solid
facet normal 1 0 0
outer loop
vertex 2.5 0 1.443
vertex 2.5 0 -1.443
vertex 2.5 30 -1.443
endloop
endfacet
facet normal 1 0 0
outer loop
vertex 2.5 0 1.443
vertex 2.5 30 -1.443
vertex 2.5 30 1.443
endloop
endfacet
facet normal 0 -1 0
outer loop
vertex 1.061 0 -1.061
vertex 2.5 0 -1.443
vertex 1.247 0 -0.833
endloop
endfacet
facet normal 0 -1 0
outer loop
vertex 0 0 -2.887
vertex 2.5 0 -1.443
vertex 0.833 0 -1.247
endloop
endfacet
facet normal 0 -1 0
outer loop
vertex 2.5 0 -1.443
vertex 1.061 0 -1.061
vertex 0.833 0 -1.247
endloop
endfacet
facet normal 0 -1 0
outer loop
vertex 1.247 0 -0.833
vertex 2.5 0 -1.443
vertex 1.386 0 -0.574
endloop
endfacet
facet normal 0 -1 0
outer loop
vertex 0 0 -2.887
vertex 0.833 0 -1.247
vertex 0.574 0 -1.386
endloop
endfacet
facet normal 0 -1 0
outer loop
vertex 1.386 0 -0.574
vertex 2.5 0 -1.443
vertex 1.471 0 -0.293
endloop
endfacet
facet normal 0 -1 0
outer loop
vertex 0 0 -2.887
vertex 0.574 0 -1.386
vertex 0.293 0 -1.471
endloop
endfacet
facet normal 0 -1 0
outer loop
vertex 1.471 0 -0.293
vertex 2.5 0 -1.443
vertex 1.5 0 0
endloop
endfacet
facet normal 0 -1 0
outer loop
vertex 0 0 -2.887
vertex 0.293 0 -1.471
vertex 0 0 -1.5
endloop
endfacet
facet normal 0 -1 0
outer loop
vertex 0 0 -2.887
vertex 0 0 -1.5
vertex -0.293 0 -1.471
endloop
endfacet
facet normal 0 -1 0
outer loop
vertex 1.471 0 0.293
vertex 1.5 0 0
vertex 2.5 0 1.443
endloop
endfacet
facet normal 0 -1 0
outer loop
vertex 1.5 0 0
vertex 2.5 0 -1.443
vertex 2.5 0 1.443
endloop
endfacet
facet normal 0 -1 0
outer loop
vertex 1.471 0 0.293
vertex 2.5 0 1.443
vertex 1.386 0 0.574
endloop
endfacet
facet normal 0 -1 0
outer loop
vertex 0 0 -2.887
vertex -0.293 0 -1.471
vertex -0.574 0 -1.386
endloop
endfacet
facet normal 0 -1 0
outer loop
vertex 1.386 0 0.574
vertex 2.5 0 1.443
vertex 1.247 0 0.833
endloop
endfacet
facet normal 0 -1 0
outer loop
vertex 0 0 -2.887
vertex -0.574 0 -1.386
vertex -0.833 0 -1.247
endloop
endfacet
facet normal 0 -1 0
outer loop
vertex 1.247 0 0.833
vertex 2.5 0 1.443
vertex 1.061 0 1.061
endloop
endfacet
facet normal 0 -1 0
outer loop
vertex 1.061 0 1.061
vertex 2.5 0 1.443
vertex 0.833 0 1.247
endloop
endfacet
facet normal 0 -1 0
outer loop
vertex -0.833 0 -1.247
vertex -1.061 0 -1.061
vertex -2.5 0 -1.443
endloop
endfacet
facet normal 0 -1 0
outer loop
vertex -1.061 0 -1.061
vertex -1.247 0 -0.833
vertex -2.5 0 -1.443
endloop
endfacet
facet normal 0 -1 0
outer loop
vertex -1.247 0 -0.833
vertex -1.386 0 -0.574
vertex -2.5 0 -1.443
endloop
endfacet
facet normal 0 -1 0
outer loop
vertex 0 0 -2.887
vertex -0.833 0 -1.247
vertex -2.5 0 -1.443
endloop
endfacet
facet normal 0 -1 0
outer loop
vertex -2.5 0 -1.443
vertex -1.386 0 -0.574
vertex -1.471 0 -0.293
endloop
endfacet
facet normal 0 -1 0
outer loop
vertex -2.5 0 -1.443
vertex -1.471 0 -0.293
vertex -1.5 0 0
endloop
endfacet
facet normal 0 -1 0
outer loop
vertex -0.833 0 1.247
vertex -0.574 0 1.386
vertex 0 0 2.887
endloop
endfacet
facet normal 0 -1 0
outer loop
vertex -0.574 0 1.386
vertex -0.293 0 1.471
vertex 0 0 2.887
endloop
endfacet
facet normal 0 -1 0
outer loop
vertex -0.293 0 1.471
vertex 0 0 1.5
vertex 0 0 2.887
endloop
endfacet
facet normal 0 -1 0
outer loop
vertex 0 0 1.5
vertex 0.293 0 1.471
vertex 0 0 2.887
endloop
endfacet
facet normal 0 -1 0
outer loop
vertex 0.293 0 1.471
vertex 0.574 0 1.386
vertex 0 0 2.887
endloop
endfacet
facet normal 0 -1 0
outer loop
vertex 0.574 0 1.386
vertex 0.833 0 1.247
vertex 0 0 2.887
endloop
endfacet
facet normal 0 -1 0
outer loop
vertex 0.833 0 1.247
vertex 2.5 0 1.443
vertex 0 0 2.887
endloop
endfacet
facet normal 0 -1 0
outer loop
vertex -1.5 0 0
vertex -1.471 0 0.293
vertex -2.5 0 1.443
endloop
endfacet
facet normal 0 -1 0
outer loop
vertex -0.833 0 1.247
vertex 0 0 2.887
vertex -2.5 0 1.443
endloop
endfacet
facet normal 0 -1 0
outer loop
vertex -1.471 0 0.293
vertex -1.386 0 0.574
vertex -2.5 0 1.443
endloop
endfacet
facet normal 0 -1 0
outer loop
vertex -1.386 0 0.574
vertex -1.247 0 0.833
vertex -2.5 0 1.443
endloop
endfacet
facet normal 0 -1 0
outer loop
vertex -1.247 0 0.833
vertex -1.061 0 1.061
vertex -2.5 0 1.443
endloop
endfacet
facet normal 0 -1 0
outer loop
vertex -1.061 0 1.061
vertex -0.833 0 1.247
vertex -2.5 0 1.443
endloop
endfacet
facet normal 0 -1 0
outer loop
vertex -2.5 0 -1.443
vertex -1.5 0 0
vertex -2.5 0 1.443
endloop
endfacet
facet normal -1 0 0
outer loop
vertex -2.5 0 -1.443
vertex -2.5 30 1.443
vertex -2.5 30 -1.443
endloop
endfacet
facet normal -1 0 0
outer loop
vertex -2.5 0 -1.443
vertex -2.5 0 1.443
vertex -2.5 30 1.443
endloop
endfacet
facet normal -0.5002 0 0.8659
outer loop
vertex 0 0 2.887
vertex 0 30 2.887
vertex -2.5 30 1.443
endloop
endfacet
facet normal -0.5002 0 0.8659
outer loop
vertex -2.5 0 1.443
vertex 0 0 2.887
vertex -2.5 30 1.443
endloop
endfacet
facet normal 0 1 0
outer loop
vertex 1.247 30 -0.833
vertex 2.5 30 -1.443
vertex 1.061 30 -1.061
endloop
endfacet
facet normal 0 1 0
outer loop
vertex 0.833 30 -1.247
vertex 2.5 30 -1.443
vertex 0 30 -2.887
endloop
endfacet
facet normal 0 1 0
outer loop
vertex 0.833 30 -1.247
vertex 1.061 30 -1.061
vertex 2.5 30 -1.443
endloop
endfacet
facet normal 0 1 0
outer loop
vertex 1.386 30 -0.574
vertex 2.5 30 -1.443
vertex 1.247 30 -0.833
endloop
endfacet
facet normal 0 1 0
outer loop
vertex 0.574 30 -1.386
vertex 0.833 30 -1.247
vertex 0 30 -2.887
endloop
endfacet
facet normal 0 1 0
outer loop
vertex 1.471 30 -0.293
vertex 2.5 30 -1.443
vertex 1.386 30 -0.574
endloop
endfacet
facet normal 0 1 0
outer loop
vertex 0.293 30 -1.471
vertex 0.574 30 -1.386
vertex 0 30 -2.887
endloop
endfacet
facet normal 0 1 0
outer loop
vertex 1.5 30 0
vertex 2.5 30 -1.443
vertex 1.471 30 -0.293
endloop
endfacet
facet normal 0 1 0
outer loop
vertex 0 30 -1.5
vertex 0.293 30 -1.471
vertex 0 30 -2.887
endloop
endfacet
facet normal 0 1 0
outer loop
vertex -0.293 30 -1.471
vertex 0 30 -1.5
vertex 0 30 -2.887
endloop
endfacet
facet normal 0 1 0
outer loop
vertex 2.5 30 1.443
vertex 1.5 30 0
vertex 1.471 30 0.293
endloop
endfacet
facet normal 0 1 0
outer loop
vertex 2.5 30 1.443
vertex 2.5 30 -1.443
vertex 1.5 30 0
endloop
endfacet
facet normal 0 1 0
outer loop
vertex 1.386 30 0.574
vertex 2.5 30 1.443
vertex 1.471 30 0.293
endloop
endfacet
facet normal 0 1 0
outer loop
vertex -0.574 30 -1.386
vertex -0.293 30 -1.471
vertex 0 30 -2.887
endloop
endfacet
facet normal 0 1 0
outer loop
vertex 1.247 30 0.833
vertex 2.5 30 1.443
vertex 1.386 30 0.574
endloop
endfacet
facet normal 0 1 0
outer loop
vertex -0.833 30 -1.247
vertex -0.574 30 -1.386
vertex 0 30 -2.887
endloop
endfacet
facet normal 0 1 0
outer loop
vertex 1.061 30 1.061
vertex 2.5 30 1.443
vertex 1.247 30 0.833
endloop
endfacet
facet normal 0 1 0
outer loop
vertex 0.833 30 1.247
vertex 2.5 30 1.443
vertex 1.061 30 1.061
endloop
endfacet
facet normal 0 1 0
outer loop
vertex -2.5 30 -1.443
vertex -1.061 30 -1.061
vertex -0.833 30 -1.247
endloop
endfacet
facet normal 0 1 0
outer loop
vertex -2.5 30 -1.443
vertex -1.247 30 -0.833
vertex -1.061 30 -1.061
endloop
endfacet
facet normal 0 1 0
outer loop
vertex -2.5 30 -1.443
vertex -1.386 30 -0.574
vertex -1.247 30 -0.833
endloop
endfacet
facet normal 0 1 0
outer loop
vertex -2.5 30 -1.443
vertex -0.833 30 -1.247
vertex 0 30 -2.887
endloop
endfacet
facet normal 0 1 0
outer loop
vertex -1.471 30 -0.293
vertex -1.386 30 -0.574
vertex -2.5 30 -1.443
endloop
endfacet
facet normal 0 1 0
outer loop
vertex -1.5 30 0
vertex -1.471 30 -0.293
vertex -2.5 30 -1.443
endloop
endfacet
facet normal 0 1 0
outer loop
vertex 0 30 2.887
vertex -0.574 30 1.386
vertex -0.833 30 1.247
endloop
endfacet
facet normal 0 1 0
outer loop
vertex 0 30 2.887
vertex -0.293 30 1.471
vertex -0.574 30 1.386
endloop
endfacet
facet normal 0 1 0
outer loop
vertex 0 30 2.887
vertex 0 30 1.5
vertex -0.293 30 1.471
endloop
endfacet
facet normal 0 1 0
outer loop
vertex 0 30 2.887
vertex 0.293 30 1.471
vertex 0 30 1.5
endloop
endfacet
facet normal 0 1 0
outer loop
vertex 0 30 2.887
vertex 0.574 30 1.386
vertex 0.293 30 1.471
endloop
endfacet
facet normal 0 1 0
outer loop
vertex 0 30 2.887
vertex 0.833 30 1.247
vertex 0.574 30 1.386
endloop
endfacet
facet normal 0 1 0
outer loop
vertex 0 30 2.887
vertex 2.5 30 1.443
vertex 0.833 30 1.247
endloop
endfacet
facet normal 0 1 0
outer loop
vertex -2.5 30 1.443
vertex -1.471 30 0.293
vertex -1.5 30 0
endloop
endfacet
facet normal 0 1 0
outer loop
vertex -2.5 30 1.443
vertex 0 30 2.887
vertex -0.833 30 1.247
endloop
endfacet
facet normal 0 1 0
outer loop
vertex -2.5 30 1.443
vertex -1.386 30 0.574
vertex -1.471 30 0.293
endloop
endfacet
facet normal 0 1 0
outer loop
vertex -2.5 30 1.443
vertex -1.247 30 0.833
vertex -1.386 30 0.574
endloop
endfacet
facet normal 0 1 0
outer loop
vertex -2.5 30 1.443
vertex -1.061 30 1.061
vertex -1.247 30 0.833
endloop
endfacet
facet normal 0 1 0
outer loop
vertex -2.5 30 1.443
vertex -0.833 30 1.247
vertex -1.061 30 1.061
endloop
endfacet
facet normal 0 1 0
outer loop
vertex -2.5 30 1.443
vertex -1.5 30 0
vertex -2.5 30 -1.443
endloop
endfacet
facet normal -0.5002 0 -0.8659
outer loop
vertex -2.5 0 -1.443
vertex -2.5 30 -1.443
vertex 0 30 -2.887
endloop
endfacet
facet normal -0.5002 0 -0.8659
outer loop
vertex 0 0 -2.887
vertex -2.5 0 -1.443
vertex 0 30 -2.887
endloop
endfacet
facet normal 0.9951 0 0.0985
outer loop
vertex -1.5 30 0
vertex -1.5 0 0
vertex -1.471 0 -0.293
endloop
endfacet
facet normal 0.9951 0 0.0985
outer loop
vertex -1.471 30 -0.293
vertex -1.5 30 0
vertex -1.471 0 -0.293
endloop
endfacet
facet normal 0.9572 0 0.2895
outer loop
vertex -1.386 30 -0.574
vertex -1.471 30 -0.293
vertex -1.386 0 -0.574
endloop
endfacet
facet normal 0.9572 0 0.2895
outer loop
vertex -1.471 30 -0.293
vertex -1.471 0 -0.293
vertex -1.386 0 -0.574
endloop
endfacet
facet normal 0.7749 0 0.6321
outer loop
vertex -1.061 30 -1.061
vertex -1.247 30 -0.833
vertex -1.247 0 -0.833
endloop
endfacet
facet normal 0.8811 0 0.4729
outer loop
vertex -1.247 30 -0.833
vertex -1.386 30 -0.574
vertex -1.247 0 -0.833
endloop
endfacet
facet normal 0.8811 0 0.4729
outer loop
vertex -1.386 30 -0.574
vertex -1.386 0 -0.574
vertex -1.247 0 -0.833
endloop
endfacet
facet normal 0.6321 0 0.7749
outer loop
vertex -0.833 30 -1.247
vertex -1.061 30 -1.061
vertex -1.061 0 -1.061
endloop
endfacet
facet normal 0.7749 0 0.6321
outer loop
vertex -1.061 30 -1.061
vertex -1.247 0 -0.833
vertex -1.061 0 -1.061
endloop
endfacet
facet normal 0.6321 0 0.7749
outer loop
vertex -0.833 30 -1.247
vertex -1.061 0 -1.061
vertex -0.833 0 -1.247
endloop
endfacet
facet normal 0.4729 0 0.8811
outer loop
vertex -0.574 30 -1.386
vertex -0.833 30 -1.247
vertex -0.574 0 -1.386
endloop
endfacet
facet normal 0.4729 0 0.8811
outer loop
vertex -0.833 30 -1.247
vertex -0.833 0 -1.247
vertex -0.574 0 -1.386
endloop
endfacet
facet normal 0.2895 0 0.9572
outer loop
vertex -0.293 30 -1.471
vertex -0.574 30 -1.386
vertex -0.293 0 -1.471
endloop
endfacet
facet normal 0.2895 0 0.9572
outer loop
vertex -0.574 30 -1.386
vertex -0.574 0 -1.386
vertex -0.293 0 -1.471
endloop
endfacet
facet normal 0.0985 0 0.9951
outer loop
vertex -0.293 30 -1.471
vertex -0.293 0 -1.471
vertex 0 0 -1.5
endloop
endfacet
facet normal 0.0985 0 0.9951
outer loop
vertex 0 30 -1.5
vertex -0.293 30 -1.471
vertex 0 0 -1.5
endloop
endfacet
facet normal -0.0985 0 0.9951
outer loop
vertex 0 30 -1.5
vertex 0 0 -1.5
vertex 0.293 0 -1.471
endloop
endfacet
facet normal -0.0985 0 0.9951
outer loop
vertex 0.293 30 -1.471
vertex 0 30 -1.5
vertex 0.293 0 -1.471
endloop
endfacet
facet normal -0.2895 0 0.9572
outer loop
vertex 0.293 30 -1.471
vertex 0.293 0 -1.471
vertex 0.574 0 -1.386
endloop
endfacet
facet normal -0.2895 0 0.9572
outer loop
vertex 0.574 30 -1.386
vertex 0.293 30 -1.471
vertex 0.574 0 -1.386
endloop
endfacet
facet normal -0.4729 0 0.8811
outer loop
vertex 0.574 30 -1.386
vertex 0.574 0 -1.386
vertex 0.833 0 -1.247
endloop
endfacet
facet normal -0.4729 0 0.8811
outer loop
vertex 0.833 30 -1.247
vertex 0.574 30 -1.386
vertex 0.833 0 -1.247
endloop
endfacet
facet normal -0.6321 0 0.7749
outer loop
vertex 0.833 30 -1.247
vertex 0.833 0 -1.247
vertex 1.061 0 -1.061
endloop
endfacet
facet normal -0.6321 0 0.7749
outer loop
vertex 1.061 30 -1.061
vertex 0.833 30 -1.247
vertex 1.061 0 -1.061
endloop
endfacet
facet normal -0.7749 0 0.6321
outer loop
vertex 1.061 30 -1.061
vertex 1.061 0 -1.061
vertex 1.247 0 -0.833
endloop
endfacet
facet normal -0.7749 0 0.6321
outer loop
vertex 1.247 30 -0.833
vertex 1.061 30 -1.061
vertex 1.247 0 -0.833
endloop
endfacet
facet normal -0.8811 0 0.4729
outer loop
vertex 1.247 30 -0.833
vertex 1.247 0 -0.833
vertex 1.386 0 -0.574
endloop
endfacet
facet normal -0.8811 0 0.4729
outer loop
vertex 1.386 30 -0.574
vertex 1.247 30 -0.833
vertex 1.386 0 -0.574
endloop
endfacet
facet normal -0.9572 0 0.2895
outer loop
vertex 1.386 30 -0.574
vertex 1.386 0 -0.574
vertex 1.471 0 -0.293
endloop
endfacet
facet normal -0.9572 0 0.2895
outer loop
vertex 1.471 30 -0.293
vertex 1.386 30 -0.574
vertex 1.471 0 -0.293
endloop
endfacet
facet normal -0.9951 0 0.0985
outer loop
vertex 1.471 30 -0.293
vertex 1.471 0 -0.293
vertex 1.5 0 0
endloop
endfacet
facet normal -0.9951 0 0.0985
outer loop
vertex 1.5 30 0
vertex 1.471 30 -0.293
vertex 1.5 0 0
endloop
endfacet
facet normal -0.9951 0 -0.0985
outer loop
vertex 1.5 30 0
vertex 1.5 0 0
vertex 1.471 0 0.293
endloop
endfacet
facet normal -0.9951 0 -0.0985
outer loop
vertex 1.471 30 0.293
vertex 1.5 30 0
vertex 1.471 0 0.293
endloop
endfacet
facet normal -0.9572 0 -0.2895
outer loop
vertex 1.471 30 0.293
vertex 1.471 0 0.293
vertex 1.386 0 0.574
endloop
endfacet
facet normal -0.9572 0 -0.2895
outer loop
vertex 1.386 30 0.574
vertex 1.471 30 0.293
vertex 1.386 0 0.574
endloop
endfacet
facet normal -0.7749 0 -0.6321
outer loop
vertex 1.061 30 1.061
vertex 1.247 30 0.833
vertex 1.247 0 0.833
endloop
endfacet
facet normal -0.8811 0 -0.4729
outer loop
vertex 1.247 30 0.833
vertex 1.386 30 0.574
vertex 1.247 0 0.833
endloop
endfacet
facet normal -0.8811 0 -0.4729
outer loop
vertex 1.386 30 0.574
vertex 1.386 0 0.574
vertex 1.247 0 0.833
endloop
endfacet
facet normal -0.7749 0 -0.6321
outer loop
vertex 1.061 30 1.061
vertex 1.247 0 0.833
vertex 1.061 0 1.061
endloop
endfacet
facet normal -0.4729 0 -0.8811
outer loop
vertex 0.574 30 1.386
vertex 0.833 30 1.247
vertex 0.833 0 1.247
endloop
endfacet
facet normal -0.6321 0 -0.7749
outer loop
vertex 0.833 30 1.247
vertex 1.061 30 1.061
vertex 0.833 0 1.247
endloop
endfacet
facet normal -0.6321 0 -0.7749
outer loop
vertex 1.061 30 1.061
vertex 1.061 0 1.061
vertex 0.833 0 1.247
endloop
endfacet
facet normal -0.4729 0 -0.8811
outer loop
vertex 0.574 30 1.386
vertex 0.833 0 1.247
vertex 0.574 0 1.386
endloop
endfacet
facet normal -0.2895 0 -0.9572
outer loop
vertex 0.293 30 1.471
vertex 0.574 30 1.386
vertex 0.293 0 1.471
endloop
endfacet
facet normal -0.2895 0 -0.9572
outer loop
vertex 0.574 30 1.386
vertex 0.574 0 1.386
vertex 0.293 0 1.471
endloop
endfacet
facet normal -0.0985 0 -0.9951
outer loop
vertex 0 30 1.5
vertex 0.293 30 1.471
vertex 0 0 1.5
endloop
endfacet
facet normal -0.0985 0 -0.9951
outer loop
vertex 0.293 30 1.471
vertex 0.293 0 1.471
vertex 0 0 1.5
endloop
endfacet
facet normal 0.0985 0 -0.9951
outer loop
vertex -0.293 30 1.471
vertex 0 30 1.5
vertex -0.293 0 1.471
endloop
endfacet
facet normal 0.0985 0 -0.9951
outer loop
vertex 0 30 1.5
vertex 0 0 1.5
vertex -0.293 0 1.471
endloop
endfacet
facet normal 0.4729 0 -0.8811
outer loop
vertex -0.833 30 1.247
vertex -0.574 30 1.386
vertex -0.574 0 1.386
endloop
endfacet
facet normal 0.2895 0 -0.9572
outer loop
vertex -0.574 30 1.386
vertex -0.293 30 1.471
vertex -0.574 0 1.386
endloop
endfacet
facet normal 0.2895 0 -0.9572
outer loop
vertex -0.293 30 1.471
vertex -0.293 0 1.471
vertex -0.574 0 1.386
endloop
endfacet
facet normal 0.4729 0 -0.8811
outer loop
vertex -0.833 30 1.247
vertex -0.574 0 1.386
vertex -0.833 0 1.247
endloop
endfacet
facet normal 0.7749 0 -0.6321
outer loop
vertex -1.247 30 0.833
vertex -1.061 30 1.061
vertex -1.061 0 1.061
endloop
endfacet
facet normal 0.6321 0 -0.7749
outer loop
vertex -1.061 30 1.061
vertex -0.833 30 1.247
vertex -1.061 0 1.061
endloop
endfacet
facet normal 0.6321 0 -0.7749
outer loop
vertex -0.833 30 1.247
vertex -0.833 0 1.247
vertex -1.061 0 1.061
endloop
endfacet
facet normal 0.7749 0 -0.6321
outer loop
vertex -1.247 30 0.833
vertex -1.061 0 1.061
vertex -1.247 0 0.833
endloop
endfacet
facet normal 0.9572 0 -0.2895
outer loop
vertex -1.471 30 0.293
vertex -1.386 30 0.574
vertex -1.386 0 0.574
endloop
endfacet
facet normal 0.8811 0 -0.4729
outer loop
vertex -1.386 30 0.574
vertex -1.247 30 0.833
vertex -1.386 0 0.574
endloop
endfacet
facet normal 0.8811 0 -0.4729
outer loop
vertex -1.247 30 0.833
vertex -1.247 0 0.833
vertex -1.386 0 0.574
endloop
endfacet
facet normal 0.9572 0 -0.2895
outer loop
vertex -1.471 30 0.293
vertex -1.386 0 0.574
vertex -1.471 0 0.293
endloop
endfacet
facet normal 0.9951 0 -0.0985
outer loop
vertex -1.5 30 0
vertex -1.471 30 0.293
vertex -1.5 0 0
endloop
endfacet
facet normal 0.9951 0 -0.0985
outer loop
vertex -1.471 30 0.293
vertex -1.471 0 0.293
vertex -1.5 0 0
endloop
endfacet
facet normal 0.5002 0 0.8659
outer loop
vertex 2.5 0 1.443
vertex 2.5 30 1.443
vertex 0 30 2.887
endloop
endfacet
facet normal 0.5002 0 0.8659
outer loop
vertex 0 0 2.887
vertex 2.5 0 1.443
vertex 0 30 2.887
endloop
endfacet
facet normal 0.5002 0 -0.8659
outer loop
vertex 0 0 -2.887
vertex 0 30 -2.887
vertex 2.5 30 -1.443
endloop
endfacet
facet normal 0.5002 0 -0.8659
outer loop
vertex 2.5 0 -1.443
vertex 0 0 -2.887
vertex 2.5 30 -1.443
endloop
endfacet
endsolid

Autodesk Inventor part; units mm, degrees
ref_plane "YZ Plane" through (0, 0, 0) normal (1, 0, 0) x (0, 1, 0)
ref_plane "XZ Plane" through (0, 0, 0) normal (0, 1, 0) x (-1, 0, 0)
ref_plane "XY Plane" through (0, 0, 0) normal (0, 0, 1) x (1, 0, 0)
sketch "Sketch1" plane through (0, 0, 0) normal (0, 1, 0) x (-1, 0, 0)
  circle A0 centre (0, 0) radius 1.5
  line L0 (-2.5, -1.4434) -> (-2.5, 1.4434)
  line L1 (-2.5, 1.4434) -> (0, 2.8868)
  line L2 (0, 2.8868) -> (2.5, 1.4434)
  line L3 (2.5, 1.4434) -> (2.5, -1.4434)
  line L4 (2.5, -1.4434) -> (0, -2.8868)
  line L5 (0, -2.8868) -> (-2.5, -1.4434)
  point P0 (-2.5, 0)
  dimension "d0" = 3
  dimension "d1" = 5
extrude "Extrusion1" add sketch "Sketch1" along normal blind 30
properties part number "Varrilla_Cobre"
